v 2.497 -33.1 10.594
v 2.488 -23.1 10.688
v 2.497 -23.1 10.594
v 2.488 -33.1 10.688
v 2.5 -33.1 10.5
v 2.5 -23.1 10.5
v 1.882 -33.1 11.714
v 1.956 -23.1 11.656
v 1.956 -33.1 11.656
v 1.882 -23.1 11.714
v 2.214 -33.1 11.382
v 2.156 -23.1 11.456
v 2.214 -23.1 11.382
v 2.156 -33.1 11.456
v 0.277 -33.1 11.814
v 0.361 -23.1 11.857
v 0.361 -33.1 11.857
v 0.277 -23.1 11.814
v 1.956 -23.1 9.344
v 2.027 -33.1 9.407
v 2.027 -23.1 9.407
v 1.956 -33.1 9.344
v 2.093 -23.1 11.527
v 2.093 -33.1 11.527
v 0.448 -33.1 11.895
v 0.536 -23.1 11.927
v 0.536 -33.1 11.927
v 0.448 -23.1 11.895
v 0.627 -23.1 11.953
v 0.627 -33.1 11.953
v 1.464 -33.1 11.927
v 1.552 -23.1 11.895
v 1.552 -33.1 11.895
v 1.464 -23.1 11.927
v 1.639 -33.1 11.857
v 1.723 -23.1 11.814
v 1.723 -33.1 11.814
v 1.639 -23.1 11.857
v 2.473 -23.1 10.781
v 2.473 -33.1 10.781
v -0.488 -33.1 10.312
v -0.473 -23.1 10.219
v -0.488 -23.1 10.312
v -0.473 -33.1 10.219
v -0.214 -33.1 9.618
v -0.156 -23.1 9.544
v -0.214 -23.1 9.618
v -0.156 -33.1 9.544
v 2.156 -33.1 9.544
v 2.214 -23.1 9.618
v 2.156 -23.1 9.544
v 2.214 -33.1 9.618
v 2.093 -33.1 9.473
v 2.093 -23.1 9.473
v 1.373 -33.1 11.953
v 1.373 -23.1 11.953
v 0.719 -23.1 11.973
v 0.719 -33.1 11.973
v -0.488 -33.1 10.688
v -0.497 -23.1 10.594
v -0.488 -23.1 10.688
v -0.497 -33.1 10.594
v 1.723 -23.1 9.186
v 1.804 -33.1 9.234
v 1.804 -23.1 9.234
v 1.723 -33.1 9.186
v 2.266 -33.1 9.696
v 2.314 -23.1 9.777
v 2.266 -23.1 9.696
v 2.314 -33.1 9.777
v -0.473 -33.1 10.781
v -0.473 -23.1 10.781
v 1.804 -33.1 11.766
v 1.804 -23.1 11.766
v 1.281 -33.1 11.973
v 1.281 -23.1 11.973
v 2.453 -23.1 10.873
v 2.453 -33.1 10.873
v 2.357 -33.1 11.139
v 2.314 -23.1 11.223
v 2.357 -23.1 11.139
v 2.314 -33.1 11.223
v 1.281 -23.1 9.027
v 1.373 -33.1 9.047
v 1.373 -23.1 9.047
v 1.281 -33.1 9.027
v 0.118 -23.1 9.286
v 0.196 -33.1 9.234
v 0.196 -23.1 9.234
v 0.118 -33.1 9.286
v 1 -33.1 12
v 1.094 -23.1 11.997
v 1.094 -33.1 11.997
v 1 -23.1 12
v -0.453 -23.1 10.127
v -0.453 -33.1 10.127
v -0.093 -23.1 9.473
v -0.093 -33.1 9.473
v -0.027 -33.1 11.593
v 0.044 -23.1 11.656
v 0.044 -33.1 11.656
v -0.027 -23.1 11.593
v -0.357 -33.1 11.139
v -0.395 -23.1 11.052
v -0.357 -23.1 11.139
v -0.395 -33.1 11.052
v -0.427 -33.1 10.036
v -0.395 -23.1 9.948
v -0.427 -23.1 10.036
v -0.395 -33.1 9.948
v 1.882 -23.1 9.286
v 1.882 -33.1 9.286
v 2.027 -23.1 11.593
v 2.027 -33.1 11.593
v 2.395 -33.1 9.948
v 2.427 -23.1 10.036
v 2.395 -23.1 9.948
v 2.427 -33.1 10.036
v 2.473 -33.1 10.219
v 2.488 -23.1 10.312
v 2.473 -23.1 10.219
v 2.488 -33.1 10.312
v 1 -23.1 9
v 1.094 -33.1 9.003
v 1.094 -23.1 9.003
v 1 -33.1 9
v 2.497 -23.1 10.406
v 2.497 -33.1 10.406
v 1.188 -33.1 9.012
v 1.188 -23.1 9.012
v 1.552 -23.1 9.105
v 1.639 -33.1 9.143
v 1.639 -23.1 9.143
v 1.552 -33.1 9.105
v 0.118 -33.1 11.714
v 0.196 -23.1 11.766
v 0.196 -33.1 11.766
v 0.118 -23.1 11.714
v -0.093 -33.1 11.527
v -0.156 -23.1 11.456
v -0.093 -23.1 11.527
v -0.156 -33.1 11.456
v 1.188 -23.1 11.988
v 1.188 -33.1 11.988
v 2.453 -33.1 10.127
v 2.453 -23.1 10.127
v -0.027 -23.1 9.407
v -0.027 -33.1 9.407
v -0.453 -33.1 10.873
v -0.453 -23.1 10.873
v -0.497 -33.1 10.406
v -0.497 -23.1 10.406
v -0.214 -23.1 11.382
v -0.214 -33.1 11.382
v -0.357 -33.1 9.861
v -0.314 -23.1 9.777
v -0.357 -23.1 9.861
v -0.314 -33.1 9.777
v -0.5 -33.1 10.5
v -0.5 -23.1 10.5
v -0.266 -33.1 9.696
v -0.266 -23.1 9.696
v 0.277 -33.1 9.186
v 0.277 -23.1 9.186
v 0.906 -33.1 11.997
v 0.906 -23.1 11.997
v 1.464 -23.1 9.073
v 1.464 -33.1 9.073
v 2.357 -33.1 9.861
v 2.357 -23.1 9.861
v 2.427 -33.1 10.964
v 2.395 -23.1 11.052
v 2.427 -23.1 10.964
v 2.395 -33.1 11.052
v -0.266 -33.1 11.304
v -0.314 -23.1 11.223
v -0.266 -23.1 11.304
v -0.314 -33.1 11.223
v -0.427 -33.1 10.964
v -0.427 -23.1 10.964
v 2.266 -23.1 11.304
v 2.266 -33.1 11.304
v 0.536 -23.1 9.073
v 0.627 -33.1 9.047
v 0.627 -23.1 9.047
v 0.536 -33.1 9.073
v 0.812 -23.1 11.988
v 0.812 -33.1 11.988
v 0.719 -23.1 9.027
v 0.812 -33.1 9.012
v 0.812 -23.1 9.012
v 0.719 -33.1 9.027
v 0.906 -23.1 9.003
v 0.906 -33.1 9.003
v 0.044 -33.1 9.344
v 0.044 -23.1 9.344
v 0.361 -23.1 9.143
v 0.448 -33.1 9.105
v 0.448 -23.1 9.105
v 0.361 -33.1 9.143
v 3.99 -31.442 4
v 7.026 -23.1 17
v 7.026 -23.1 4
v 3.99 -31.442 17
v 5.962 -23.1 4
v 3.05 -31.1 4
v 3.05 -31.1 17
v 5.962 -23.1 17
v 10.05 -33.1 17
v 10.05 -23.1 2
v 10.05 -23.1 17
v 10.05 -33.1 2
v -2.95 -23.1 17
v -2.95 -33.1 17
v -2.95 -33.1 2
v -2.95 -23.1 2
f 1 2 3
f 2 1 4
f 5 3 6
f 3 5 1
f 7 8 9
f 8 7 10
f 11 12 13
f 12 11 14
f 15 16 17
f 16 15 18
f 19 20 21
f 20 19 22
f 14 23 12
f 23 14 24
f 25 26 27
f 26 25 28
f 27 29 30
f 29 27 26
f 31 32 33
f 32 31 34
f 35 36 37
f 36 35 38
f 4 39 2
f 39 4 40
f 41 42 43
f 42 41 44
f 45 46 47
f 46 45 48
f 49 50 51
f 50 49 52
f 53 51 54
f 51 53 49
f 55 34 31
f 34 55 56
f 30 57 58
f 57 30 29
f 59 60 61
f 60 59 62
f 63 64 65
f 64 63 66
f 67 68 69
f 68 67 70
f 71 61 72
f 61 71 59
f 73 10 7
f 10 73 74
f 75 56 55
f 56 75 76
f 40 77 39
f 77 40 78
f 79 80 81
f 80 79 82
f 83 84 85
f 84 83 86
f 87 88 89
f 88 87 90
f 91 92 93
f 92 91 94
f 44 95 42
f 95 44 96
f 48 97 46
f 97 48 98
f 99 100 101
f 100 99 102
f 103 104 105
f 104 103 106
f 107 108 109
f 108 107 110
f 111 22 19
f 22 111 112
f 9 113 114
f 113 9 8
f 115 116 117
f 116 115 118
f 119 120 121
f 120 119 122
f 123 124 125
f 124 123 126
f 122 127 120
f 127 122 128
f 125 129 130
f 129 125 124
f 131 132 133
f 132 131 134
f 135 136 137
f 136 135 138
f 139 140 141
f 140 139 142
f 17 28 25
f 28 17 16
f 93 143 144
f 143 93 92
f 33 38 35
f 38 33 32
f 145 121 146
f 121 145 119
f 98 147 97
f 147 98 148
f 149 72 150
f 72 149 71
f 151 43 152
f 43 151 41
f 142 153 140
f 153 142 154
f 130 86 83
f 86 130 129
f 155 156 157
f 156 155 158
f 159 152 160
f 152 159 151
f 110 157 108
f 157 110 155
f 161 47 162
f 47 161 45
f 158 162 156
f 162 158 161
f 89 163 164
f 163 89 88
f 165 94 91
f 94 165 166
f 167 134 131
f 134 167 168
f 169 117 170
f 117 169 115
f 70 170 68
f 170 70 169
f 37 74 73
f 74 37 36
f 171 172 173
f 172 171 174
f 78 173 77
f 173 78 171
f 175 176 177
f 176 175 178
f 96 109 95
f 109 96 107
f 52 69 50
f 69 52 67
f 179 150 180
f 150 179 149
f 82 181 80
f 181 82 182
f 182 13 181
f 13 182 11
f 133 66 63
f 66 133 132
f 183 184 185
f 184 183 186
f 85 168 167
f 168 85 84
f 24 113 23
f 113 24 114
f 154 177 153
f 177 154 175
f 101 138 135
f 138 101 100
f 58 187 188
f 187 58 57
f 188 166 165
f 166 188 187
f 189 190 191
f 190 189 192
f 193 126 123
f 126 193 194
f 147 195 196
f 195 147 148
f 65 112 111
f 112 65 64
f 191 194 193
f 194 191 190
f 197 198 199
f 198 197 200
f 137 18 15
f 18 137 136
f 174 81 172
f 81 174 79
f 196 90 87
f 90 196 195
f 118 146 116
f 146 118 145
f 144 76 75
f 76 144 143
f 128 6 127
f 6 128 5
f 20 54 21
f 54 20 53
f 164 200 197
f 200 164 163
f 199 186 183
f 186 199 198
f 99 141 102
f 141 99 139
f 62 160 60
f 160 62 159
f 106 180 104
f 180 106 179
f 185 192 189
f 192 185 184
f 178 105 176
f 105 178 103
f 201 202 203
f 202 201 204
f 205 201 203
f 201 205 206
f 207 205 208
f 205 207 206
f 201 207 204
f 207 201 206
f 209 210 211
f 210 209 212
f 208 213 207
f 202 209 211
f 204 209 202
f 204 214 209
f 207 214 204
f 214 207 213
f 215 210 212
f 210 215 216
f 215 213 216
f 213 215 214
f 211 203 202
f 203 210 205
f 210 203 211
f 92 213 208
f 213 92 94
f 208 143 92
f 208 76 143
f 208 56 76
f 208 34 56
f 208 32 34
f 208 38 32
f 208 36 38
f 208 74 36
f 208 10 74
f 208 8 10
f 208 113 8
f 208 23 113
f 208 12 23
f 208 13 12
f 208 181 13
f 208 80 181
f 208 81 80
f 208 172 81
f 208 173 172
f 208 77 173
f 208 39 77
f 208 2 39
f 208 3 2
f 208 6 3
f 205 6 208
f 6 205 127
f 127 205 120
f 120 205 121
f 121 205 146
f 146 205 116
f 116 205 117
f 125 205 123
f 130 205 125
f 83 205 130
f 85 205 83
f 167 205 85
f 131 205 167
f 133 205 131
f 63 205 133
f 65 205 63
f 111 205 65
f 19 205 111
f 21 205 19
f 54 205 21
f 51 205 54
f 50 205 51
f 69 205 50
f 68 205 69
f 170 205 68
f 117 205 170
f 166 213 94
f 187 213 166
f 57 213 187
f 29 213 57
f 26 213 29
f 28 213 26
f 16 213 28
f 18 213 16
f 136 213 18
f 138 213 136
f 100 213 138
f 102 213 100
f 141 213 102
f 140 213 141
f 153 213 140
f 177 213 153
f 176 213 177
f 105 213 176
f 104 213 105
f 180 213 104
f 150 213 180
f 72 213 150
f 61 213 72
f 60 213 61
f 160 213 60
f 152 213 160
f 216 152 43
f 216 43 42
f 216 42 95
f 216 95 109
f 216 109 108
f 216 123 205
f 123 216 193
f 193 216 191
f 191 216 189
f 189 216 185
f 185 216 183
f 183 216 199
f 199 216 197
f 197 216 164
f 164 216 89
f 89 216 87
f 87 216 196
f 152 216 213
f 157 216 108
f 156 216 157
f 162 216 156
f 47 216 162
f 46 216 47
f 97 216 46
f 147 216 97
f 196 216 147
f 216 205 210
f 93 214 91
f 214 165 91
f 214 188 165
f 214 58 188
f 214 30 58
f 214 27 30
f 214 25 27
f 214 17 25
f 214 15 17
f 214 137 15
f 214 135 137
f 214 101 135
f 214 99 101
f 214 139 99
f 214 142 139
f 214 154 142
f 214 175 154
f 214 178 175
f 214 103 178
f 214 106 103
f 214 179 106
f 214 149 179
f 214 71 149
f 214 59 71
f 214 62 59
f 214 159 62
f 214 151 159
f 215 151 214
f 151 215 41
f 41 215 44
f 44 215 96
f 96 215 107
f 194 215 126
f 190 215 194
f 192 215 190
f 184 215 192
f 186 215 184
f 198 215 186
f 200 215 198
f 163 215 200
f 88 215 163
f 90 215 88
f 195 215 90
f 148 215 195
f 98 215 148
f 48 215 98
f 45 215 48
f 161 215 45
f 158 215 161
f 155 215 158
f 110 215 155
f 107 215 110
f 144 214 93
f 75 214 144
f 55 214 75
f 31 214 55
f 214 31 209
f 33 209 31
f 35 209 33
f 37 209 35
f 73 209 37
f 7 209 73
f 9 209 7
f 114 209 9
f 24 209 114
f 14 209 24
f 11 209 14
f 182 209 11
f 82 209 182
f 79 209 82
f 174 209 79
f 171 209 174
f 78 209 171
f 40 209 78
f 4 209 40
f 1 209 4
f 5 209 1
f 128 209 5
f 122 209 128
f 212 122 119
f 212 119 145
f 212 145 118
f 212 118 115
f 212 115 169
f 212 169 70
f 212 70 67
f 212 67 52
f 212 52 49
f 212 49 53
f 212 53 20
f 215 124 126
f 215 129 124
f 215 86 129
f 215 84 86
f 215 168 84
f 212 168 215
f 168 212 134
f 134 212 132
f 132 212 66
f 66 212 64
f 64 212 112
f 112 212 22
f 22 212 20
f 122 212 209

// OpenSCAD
breedte = 22.7;
hele_breedte = 32.5;
diepte = 27;
dikte_rand = 2.5;
marge = 0.2;


motor_breedte = hele_breedte+marge*2;
motor_lengte = diepte+marge*2;

breedte_ruimte_tussen_2_motoren = 2;
lengte_ruimte_tussen_2_motoren = 2;


difference(){
	union(){
         

        translate([-motor_breedte/2+9.5+4   ,  -motor_lengte-motor_lengte/2-lengte_ruimte_tussen_2_motoren+6+4,2]){
            cube([
            13
            ,10
            ,15], center=false);
        }        


	}
	union() {
        translate([1,15,10.5]){
            rotate([90,0,0]){
                cylinder(h=1000, r=1.5, $fn=100, center=false);
            }
        }   

        translate([-motor_breedte/2+9.5+2+8   ,  -motor_lengte-motor_lengte/2-lengte_ruimte_tussen_2_motoren+6+6,4]){
            rotate([0,0,-20]){
                cube([
                1
                ,15
                ,30], center=false);
            }
        }       
        

	}
}
